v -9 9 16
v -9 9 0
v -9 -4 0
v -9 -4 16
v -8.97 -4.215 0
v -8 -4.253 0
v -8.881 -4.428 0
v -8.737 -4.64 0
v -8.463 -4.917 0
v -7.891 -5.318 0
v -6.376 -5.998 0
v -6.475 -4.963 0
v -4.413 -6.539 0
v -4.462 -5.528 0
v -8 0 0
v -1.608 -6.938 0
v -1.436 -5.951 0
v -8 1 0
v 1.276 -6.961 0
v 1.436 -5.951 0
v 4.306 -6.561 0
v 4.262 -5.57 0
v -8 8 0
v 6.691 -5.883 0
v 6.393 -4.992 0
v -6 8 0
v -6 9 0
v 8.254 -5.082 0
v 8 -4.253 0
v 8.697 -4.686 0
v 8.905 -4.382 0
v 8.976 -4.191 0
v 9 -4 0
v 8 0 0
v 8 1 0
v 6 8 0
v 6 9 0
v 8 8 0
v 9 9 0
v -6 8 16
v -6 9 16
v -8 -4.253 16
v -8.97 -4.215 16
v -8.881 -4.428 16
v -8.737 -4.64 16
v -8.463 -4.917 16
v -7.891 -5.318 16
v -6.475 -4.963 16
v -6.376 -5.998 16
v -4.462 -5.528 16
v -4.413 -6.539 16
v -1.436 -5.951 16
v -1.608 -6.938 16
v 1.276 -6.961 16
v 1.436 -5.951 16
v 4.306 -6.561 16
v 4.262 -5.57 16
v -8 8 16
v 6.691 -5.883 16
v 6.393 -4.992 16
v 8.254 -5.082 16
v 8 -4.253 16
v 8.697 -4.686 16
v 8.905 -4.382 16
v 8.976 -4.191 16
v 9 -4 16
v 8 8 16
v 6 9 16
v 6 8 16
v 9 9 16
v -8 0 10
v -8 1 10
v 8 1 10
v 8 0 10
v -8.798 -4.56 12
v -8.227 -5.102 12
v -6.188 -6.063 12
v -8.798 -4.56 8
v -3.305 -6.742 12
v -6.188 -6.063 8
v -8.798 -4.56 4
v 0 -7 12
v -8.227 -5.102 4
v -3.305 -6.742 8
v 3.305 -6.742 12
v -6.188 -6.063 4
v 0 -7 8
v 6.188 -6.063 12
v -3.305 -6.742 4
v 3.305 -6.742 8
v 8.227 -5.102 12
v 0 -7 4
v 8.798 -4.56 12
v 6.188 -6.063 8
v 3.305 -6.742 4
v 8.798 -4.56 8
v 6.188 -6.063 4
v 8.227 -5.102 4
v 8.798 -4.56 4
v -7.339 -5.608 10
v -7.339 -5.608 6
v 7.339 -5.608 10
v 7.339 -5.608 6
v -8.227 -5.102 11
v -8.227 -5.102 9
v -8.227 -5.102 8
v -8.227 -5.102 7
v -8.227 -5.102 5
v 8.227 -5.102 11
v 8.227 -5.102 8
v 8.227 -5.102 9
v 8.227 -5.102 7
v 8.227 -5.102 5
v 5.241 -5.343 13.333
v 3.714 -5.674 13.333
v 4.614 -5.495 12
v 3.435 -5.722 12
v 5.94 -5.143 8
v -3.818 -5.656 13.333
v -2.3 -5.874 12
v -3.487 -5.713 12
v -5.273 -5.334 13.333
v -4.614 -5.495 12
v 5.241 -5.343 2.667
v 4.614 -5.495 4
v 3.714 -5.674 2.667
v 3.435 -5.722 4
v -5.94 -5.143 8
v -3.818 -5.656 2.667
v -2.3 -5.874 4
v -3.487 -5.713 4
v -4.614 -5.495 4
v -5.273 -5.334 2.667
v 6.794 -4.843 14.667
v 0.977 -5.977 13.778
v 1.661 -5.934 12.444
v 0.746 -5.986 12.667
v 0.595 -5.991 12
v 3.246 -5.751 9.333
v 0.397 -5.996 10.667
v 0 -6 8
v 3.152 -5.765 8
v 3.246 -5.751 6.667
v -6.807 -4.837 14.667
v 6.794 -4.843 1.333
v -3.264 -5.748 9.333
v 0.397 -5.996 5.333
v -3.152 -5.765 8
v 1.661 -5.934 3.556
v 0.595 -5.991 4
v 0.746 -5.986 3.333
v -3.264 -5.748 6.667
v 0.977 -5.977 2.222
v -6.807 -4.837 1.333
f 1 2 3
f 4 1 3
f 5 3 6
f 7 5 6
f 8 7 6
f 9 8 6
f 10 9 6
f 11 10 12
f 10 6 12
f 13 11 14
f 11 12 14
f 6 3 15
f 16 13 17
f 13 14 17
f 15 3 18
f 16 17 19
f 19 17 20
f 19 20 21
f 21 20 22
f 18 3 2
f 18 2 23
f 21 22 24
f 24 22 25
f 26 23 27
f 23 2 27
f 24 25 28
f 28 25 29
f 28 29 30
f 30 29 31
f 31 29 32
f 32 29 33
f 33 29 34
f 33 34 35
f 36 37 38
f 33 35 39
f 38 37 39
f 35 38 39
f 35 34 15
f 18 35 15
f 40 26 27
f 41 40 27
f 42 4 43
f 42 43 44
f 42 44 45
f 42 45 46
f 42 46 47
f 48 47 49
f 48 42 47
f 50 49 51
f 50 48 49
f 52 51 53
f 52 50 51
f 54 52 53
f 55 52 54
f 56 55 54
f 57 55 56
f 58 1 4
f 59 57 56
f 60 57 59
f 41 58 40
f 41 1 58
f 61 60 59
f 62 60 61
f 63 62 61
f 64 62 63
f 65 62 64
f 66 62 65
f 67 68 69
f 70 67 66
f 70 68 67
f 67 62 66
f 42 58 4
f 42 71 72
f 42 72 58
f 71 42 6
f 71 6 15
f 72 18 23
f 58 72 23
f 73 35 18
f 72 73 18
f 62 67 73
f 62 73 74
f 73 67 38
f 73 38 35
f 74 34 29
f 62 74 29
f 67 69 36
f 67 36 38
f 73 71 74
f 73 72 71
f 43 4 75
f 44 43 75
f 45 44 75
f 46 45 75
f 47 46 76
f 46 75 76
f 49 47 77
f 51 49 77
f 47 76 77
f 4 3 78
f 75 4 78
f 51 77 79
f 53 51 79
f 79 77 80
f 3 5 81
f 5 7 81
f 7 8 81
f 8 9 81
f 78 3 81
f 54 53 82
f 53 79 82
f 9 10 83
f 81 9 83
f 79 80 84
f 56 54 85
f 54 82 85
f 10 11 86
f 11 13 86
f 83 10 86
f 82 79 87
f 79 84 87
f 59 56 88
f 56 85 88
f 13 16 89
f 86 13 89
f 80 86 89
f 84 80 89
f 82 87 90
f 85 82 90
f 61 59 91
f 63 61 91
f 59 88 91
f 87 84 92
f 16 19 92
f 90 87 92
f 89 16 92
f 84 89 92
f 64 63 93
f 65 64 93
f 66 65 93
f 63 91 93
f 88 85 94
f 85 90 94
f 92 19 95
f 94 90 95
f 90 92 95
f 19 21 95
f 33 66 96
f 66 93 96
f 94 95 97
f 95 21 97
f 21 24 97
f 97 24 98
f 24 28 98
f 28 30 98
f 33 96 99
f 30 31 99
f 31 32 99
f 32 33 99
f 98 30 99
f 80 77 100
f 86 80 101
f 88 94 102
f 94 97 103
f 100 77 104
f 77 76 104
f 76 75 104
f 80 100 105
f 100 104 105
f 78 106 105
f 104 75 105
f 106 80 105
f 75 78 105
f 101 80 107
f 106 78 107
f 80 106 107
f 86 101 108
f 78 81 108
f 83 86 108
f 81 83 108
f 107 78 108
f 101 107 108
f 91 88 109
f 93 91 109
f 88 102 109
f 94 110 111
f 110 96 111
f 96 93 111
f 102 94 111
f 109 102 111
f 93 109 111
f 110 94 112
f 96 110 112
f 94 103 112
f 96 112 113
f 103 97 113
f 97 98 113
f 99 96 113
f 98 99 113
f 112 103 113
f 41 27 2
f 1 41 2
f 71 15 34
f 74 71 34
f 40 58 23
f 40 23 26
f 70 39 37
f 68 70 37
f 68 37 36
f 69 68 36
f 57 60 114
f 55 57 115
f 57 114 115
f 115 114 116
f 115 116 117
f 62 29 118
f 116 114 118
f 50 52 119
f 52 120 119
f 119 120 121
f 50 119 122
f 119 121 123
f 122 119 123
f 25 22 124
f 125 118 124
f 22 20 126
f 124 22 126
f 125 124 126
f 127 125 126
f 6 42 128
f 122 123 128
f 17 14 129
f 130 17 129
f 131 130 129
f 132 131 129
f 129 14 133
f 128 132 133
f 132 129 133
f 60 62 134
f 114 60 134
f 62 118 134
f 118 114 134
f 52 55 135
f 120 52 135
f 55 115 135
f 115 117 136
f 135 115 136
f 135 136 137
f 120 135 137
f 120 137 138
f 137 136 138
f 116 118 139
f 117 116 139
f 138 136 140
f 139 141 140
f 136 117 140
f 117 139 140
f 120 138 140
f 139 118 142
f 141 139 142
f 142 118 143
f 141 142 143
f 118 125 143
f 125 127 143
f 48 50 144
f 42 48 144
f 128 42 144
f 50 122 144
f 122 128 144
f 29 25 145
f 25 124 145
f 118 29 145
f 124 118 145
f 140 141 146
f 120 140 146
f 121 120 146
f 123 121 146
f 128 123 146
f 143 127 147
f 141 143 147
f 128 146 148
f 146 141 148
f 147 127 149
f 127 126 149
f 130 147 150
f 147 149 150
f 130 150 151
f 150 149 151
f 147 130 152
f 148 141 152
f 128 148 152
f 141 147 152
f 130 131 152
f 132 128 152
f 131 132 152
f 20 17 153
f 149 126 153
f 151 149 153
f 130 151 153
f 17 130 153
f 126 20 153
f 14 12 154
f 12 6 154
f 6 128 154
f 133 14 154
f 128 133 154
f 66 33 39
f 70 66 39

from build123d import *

# Parameters (mm, degrees)
F1_DEPTH = 16
F2_DEPTH = 10


with BuildPart() as f1:
    # F0 (on Top) → F1 (new body)
    with BuildSketch(Plane.XY):
        with BuildLine():
            Line((-9, 9), (-9, 0))
            Line((-9, 0), (-9, -3))
            add(Edge.make_bspline(
                [(-9, -3), (-9, -2.5707676204), (-8.6315191286, -2.1415352408), (-8, -1.7474503993)],
                knots=[0, 0, 0, 0, 0.0715387299, 0.0715387299, 0.0715387299, 0.0715387299], degree=3))
            Line((-8, -1.7474503993), (-8, 0))
            Line((-8, 0), (-8, 1))
            Line((-8, 1), (-8, 8))
            Line((-8, 8), (-6, 8))
            Line((-6, 8), (-6, 9))
            Line((-6, 9), (-9, 9))
        make_face()
        with BuildLine():
            add(Edge.make_bspline(
                [(-9, -3), (-9, -2.5707676204), (-8.6315191286, -2.1415352408), (-8, -1.7474503993)],
                knots=[0, 0, 0, 0, 0.0715387299, 0.0715387299, 0.0715387299, 0.0715387299], degree=3))
            add(Edge.make_bspline(
                [(-8.8381918042, -3.5), (-8.9439804927, -3.3347222947), (-9, -3.1673611473), (-9, -3)],
                knots=[0.9721064754, 0.9721064754, 0.9721064754, 0.9721064754, 1, 1, 1, 1], degree=3))
            add(Edge.make_bspline(
                [(-8, -2.7474503993), (-8.3852847555, -2.9878784004), (-8.6726634562, -3.2413887449), (-8.8381918042, -3.5)],
                knots=[0.9284612701, 0.9284612701, 0.9284612701, 0.9284612701, 0.9721064754, 0.9721064754, 0.9721064754, 0.9721064754], degree=3))
            Line((-8, -2.7474503993), (-8, -1.7474503993))
        make_face()
        with BuildLine():
            add(Edge.make_bspline(
                [(-8.8381918042, -3.5), (-8.9439804927, -3.3347222947), (-9, -3.1673611473), (-9, -3)],
                knots=[0.9721064754, 0.9721064754, 0.9721064754, 0.9721064754, 1, 1, 1, 1], degree=3))
            Line((-9, -3), (-9, -4))
            add(Edge.make_bspline(
                [(-8.8381918042, -3.5), (-8.9439804927, -3.6652777053), (-9, -3.8326388527), (-9, -4)],
                knots=[0.9721064754, 0.9721064754, 0.9721064754, 0.9721064754, 1, 1, 1, 1], degree=3))
        make_face()
        with BuildLine():
            add(Edge.make_bspline(
                [(-8, -2.7474503993), (-8.3852847555, -2.9878784004), (-8.6726634562, -3.2413887449), (-8.8381918042, -3.5)],
                knots=[0.9284612701, 0.9284612701, 0.9284612701, 0.9284612701, 0.9721064754, 0.9721064754, 0.9721064754, 0.9721064754], degree=3))
            add(Edge.make_bspline(
                [(-8, -4.2525496007), (-8.3852847555, -4.0121215996), (-8.6726634562, -3.7586112551), (-8.8381918042, -3.5)],
                knots=[0.9284612701, 0.9284612701, 0.9284612701, 0.9284612701, 0.9721064754, 0.9721064754, 0.9721064754, 0.9721064754], degree=3))
            Line((-8, -4.2525496007), (-8, -2.7474503993))
        make_face()
        with BuildLine():
            add(Edge.make_bspline(
                [(-8.8381918042, -3.5), (-8.9439804927, -3.6652777053), (-9, -3.8326388527), (-9, -4)],
                knots=[0.9721064754, 0.9721064754, 0.9721064754, 0.9721064754, 1, 1, 1, 1], degree=3))
            add(Edge.make_bspline(
                [(-9, -4), (-9, -5.5), (0, -8.5), (9, -5.5), (9, -4)],
                knots=[0, 0, 0, 0, 0.25, 0.5, 0.5, 0.5, 0.5], degree=3))
            add(Edge.make_bspline(
                [(9, -4), (9, -3.8326388527), (8.9439804927, -3.6652777053), (8.8381918042, -3.5)],
                knots=[0.5, 0.5, 0.5, 0.5, 0.5278935246, 0.5278935246, 0.5278935246, 0.5278935246], degree=3))
            add(Edge.make_bspline(
                [(8.8381918042, -3.5), (8.6726634562, -3.7586112551), (8.3852847555, -4.0121215996), (8, -4.2525496007)],
                knots=[0.5278935246, 0.5278935246, 0.5278935246, 0.5278935246, 0.5715387299, 0.5715387299, 0.5715387299, 0.5715387299], degree=3))
            add(Edge.make_bspline(
                [(8, -4.2525496007), (6.4246057224, -5.2356378021), (0, -6.7643621979), (-6.4246057224, -5.2356378021), (-8, -4.2525496007)],
                knots=[0.5715387299, 0.5715387299, 0.5715387299, 0.5715387299, 0.75, 0.9284612701, 0.9284612701, 0.9284612701, 0.9284612701], degree=3))
            add(Edge.make_bspline(
                [(-8, -4.2525496007), (-8.3852847555, -4.0121215996), (-8.6726634562, -3.7586112551), (-8.8381918042, -3.5)],
                knots=[0.9284612701, 0.9284612701, 0.9284612701, 0.9284612701, 0.9721064754, 0.9721064754, 0.9721064754, 0.9721064754], degree=3))
        make_face()
        with BuildLine():
            add(Edge.make_bspline(
                [(8.8381918042, -3.5), (8.6726634562, -3.7586112551), (8.3852847555, -4.0121215996), (8, -4.2525496007)],
                knots=[0.5278935246, 0.5278935246, 0.5278935246, 0.5278935246, 0.5715387299, 0.5715387299, 0.5715387299, 0.5715387299], degree=3))
            add(Edge.make_bspline(
                [(8.8381918042, -3.5), (8.6726634562, -3.2413887449), (8.3852847555, -2.9878784004), (8, -2.7474503993)],
                knots=[0.5278935246, 0.5278935246, 0.5278935246, 0.5278935246, 0.5715387299, 0.5715387299, 0.5715387299, 0.5715387299], degree=3))
            Line((8, -2.7474503993), (8, -4.2525496007))
        make_face()
        with BuildLine():
            add(Edge.make_bspline(
                [(9, -3), (9, -3.1673611473), (8.9439804927, -3.3347222947), (8.8381918042, -3.5)],
                knots=[0.5, 0.5, 0.5, 0.5, 0.5278935246, 0.5278935246, 0.5278935246, 0.5278935246], degree=3))
            add(Edge.make_bspline(
                [(8, -1.7474503993), (8.6315191286, -2.1415352408), (9, -2.5707676204), (9, -3)],
                knots=[0.4284612701, 0.4284612701, 0.4284612701, 0.4284612701, 0.5, 0.5, 0.5, 0.5], degree=3))
            Line((8, -1.7474503993), (8, -2.7474503993))
            add(Edge.make_bspline(
                [(8.8381918042, -3.5), (8.6726634562, -3.2413887449), (8.3852847555, -2.9878784004), (8, -2.7474503993)],
                knots=[0.5278935246, 0.5278935246, 0.5278935246, 0.5278935246, 0.5715387299, 0.5715387299, 0.5715387299, 0.5715387299], degree=3))
        make_face()
        with BuildLine():
            add(Edge.make_bspline(
                [(8, -1.7474503993), (8.6315191286, -2.1415352408), (9, -2.5707676204), (9, -3)],
                knots=[0.4284612701, 0.4284612701, 0.4284612701, 0.4284612701, 0.5, 0.5, 0.5, 0.5], degree=3))
            Line((9, -3), (9, 0))
            Line((9, 0), (9, 9))
            Line((9, 9), (6, 9))
            Line((6, 9), (6, 8))
            Line((6, 8), (8, 8))
            Line((8, 8), (8, 1))
            Line((8, 1), (8, 0))
            Line((8, 0), (8, -1.7474503993))
        make_face()
        with BuildLine():
            add(Edge.make_bspline(
                [(9, -4), (9, -3.8326388527), (8.9439804927, -3.6652777053), (8.8381918042, -3.5)],
                knots=[0.5, 0.5, 0.5, 0.5, 0.5278935246, 0.5278935246, 0.5278935246, 0.5278935246], degree=3))
            Line((9, -4), (9, -3))
            add(Edge.make_bspline(
                [(9, -3), (9, -3.1673611473), (8.9439804927, -3.3347222947), (8.8381918042, -3.5)],
                knots=[0.5, 0.5, 0.5, 0.5, 0.5278935246, 0.5278935246, 0.5278935246, 0.5278935246], degree=3))
        make_face()
    extrude(amount=F1_DEPTH)

    # F0 (on Top) → F2 (join)
    with BuildSketch(Plane.XY):
        Polygon((-8, 0), (0, 0), (8, 0), (8, 1), (-8, 1), align=None)
    extrude(amount=F2_DEPTH)


solid = f1.part
